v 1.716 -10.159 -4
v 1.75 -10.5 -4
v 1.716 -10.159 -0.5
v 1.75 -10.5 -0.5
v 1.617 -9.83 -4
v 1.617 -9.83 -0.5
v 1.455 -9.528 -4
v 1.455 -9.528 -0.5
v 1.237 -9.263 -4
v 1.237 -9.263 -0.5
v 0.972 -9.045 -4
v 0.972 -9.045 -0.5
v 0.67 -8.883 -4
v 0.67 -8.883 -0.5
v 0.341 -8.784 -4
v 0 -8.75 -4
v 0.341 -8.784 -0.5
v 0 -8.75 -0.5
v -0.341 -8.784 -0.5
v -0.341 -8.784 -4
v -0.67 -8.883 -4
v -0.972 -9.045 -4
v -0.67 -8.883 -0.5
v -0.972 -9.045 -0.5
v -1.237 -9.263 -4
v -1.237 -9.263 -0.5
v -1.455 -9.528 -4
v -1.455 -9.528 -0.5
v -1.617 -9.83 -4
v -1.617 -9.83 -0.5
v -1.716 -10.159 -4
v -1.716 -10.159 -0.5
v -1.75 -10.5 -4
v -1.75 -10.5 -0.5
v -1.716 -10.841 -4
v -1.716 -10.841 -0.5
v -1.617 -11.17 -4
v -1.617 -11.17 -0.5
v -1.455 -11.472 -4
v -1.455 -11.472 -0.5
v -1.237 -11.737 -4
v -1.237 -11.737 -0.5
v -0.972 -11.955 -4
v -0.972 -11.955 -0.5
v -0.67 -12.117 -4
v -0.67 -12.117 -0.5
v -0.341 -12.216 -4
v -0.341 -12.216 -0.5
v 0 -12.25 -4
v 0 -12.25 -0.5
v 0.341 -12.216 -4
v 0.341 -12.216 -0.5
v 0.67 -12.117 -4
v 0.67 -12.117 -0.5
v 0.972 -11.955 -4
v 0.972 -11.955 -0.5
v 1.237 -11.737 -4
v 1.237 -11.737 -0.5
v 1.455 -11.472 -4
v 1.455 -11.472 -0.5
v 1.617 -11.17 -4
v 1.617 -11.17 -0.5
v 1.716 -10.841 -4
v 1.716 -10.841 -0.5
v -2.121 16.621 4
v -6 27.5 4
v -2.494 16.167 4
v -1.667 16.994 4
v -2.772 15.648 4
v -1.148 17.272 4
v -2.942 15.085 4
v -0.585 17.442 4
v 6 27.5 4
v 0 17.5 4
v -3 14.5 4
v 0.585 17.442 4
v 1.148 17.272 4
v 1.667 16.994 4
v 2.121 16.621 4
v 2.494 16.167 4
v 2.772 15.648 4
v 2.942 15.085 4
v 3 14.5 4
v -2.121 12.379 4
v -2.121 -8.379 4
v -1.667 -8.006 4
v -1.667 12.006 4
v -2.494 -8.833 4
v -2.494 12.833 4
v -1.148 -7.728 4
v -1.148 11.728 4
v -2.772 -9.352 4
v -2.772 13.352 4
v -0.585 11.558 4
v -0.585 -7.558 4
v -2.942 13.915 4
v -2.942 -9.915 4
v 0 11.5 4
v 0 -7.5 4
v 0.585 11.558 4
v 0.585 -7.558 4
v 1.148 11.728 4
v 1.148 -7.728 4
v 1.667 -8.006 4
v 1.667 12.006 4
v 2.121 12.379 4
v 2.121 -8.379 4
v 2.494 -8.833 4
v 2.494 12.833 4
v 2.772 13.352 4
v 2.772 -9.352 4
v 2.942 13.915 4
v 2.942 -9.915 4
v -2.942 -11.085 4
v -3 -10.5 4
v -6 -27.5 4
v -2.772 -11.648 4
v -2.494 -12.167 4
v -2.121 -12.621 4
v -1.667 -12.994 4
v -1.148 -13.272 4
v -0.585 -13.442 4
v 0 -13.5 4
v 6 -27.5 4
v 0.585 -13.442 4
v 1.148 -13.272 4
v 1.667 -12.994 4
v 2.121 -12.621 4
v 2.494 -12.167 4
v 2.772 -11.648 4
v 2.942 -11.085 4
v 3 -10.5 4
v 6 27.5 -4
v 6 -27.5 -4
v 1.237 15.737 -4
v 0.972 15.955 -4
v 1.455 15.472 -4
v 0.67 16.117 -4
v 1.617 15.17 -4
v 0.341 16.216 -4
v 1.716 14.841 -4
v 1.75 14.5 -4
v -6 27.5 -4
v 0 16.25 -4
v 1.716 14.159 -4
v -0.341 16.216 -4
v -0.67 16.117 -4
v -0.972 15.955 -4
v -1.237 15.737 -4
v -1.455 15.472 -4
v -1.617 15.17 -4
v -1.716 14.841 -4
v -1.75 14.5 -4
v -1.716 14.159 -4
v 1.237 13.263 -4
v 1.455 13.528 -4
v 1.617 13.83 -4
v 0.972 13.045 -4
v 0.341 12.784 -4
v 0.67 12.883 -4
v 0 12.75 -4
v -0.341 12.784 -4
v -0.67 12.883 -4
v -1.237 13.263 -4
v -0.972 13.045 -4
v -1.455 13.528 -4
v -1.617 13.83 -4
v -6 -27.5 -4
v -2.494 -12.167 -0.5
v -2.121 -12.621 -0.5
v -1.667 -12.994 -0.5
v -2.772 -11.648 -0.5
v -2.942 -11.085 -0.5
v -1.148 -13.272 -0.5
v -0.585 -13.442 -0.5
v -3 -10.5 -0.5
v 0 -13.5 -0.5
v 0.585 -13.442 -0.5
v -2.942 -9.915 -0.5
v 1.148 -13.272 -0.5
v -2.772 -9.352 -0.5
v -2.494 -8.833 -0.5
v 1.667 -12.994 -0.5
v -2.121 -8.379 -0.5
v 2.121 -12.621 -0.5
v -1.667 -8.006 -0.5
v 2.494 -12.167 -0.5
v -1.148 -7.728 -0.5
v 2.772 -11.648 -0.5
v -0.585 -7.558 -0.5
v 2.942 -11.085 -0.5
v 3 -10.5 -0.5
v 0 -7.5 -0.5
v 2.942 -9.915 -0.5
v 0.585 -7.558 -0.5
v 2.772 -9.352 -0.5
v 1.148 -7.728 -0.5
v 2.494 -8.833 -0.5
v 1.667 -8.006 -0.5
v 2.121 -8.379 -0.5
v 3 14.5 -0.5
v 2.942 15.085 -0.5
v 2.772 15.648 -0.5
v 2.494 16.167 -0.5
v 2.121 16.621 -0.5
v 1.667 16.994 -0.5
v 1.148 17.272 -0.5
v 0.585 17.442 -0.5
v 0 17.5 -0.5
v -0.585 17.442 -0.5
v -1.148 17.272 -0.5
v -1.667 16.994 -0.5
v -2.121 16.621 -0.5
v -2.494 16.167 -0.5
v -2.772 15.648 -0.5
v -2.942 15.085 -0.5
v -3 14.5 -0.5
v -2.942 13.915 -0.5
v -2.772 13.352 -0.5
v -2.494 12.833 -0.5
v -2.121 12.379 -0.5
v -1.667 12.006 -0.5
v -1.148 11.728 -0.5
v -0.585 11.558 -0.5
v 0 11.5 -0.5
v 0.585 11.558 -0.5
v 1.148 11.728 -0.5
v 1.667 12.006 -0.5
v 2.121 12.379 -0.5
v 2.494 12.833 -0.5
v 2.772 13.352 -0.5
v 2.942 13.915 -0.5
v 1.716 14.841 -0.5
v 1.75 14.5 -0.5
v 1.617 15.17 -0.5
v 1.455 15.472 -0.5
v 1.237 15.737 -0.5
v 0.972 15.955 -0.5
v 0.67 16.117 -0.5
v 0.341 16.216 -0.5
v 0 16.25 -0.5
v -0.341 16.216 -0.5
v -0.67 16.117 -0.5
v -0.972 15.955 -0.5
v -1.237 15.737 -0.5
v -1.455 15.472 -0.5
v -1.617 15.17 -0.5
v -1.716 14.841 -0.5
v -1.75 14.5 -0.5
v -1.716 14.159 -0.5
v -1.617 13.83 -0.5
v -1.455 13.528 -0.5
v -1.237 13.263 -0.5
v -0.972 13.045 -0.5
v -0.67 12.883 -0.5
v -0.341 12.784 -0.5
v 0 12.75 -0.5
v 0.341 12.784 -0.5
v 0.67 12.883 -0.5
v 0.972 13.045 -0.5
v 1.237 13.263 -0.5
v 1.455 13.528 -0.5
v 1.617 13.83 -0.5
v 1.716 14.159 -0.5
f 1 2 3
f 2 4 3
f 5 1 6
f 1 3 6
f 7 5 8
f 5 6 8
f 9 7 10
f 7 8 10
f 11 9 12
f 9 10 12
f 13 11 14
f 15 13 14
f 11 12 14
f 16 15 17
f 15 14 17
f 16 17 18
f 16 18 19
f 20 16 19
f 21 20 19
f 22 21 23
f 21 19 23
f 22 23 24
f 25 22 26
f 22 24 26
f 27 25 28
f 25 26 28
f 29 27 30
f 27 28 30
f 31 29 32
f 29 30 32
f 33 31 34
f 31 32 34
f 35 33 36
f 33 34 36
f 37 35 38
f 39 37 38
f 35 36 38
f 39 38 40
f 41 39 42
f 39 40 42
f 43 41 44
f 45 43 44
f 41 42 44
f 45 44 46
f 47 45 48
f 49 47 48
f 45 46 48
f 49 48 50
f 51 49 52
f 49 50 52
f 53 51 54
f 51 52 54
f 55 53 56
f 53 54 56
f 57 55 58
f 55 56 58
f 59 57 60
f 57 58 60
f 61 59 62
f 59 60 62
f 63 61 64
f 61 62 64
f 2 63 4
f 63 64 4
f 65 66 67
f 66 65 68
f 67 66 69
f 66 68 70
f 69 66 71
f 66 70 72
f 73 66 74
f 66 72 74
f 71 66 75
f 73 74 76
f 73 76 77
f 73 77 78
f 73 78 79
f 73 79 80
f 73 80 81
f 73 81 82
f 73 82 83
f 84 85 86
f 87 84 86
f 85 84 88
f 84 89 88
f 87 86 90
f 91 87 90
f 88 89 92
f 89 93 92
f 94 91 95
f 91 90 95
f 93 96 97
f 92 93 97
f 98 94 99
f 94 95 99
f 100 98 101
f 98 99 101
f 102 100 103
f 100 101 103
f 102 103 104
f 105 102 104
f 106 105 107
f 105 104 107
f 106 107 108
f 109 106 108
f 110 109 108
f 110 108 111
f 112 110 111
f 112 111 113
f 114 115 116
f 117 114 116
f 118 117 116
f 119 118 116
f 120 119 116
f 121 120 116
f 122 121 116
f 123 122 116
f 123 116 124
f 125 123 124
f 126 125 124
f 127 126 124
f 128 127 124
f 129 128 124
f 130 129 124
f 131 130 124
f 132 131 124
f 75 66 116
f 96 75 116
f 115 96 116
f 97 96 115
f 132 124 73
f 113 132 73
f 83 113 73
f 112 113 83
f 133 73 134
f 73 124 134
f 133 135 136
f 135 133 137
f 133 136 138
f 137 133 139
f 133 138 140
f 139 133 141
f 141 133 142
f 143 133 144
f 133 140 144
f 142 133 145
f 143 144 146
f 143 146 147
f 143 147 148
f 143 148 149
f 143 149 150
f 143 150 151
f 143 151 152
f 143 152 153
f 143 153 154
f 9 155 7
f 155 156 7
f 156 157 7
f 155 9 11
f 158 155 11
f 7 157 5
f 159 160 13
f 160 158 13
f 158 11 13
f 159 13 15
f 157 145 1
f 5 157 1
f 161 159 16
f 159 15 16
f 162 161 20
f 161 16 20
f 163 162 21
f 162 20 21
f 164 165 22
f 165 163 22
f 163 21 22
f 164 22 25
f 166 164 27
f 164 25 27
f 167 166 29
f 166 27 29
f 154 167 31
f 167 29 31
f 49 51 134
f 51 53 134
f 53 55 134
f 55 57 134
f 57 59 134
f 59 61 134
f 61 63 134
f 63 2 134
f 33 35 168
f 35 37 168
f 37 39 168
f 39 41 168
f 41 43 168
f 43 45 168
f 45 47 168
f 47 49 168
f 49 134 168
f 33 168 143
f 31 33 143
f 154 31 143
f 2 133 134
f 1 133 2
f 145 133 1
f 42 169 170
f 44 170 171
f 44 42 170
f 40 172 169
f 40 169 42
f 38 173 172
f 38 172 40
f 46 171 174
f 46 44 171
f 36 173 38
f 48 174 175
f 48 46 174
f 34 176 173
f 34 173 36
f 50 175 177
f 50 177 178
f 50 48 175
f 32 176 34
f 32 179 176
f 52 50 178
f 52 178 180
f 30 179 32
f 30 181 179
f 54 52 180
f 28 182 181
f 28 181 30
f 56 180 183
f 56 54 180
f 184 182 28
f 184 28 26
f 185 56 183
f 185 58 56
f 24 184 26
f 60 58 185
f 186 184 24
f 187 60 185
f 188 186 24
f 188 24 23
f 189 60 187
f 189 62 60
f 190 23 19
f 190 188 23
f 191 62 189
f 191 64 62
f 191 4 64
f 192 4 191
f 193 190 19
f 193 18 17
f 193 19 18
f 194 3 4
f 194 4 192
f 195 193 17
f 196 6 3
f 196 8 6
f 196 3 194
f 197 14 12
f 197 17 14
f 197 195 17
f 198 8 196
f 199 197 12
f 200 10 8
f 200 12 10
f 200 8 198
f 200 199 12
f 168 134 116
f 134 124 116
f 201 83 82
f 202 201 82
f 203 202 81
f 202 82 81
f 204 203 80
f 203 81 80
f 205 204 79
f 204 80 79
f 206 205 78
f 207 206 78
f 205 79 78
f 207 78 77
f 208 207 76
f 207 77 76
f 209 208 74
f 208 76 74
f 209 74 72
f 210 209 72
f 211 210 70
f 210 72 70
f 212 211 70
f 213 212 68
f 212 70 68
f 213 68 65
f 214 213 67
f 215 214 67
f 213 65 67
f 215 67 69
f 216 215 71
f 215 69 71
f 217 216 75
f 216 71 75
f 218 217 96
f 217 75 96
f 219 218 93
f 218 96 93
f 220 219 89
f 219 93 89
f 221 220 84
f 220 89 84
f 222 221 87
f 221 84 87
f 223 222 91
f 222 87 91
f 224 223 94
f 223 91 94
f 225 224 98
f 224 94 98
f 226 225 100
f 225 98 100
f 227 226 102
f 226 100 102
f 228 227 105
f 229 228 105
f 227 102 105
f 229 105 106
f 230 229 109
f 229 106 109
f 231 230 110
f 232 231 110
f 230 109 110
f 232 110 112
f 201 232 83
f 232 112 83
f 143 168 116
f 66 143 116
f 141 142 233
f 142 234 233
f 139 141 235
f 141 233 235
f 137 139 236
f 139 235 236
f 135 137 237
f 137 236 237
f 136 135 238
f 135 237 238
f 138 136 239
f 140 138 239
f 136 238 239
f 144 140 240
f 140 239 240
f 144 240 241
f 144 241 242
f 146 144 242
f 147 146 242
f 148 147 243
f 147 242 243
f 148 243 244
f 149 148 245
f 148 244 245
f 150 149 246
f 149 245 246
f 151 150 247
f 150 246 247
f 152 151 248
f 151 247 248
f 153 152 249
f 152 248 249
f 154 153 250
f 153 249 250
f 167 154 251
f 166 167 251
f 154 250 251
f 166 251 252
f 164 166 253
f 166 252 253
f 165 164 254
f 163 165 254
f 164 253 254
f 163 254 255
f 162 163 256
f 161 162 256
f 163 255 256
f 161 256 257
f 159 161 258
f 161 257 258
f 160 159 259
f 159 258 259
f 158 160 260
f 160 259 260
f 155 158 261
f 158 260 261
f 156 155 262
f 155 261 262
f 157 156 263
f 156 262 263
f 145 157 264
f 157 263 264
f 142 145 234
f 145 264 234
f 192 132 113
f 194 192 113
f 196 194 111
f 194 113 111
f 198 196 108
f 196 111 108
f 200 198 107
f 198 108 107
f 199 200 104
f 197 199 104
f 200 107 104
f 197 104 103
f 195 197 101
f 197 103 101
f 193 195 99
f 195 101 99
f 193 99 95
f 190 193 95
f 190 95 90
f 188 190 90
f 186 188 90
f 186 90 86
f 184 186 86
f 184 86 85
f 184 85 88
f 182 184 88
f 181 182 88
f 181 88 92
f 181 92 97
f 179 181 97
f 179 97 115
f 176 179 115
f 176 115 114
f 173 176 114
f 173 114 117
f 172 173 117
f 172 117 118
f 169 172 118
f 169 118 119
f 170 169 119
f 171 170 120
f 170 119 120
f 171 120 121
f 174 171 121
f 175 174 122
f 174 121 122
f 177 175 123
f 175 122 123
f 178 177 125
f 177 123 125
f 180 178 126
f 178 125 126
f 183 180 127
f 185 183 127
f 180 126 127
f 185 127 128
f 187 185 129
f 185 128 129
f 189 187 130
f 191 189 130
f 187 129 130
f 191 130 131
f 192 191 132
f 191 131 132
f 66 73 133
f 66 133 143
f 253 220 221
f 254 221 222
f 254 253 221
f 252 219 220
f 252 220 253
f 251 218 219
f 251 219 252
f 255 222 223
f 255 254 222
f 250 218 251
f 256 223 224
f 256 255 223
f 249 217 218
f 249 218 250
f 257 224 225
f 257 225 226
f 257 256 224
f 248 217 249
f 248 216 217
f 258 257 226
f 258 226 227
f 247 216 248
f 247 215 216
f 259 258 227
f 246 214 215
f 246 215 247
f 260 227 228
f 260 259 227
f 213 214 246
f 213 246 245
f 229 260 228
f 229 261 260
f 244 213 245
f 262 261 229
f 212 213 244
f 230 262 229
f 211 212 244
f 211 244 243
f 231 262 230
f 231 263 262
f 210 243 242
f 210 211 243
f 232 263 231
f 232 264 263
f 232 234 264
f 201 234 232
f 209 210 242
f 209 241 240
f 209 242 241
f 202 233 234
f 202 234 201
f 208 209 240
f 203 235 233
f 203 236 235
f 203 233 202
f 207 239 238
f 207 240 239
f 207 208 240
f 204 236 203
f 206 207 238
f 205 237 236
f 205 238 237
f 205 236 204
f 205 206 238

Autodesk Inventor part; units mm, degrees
sketch "Эскиз1" plane through (0, 0, 0) normal (0, 1, 0) x (-1, 0, 0)
  line L0 (6, 4) -> (-6, 4)
  line L1 (-6, 4) -> (-6, -4)
  line L2 (-6, -4) -> (6, -4)
  line L3 (6, -4) -> (6, 4)
  line L4 (6, 4) -> (-6, -4) construction
  line L5 (-6, 4) -> (6, -4) construction
  point P0 (0, 0)
  dimension "d0" = 12
  dimension "d1" = 8
extrude "Выдавливание1" add sketch "Эскиз1" along normal mid plane 55
sketch "Эскиз2" plane through (-6, 27.5, 4) normal (0, 0, 1) x (1, 0, 0)
  circle A0 centre (6, -13) radius 1.75
  line L0 (0, 0) -> (12, 0) projected
  line L1 (6, 11) -> (6, -66) construction
  point P0 (6, -27.5)
  dimension "d4" = 13
  dimension "d5" = 3.5
extrude "Выдавливание2" cut sketch "Эскиз2" against normal up to next
sketch "Эскиз3" plane through (-6, 27.5, 4) normal (0, 0, 1) x (1, 0, 0)
  circle A0 centre (6, -13) radius 1.75 projected
  circle A1 centre (6, -13) radius 3
  point P0 (6, -27.5)
  dimension "d8" = 6
extrude "Выдавливание3" cut sketch "Эскиз3" against normal blind 4.5
pattern_linear "Прямоуг.массив1" count 2 spacing 25 along (0, -1, 0) of "Выдавливание3", "Выдавливание2"
properties part number "Направляющая"
